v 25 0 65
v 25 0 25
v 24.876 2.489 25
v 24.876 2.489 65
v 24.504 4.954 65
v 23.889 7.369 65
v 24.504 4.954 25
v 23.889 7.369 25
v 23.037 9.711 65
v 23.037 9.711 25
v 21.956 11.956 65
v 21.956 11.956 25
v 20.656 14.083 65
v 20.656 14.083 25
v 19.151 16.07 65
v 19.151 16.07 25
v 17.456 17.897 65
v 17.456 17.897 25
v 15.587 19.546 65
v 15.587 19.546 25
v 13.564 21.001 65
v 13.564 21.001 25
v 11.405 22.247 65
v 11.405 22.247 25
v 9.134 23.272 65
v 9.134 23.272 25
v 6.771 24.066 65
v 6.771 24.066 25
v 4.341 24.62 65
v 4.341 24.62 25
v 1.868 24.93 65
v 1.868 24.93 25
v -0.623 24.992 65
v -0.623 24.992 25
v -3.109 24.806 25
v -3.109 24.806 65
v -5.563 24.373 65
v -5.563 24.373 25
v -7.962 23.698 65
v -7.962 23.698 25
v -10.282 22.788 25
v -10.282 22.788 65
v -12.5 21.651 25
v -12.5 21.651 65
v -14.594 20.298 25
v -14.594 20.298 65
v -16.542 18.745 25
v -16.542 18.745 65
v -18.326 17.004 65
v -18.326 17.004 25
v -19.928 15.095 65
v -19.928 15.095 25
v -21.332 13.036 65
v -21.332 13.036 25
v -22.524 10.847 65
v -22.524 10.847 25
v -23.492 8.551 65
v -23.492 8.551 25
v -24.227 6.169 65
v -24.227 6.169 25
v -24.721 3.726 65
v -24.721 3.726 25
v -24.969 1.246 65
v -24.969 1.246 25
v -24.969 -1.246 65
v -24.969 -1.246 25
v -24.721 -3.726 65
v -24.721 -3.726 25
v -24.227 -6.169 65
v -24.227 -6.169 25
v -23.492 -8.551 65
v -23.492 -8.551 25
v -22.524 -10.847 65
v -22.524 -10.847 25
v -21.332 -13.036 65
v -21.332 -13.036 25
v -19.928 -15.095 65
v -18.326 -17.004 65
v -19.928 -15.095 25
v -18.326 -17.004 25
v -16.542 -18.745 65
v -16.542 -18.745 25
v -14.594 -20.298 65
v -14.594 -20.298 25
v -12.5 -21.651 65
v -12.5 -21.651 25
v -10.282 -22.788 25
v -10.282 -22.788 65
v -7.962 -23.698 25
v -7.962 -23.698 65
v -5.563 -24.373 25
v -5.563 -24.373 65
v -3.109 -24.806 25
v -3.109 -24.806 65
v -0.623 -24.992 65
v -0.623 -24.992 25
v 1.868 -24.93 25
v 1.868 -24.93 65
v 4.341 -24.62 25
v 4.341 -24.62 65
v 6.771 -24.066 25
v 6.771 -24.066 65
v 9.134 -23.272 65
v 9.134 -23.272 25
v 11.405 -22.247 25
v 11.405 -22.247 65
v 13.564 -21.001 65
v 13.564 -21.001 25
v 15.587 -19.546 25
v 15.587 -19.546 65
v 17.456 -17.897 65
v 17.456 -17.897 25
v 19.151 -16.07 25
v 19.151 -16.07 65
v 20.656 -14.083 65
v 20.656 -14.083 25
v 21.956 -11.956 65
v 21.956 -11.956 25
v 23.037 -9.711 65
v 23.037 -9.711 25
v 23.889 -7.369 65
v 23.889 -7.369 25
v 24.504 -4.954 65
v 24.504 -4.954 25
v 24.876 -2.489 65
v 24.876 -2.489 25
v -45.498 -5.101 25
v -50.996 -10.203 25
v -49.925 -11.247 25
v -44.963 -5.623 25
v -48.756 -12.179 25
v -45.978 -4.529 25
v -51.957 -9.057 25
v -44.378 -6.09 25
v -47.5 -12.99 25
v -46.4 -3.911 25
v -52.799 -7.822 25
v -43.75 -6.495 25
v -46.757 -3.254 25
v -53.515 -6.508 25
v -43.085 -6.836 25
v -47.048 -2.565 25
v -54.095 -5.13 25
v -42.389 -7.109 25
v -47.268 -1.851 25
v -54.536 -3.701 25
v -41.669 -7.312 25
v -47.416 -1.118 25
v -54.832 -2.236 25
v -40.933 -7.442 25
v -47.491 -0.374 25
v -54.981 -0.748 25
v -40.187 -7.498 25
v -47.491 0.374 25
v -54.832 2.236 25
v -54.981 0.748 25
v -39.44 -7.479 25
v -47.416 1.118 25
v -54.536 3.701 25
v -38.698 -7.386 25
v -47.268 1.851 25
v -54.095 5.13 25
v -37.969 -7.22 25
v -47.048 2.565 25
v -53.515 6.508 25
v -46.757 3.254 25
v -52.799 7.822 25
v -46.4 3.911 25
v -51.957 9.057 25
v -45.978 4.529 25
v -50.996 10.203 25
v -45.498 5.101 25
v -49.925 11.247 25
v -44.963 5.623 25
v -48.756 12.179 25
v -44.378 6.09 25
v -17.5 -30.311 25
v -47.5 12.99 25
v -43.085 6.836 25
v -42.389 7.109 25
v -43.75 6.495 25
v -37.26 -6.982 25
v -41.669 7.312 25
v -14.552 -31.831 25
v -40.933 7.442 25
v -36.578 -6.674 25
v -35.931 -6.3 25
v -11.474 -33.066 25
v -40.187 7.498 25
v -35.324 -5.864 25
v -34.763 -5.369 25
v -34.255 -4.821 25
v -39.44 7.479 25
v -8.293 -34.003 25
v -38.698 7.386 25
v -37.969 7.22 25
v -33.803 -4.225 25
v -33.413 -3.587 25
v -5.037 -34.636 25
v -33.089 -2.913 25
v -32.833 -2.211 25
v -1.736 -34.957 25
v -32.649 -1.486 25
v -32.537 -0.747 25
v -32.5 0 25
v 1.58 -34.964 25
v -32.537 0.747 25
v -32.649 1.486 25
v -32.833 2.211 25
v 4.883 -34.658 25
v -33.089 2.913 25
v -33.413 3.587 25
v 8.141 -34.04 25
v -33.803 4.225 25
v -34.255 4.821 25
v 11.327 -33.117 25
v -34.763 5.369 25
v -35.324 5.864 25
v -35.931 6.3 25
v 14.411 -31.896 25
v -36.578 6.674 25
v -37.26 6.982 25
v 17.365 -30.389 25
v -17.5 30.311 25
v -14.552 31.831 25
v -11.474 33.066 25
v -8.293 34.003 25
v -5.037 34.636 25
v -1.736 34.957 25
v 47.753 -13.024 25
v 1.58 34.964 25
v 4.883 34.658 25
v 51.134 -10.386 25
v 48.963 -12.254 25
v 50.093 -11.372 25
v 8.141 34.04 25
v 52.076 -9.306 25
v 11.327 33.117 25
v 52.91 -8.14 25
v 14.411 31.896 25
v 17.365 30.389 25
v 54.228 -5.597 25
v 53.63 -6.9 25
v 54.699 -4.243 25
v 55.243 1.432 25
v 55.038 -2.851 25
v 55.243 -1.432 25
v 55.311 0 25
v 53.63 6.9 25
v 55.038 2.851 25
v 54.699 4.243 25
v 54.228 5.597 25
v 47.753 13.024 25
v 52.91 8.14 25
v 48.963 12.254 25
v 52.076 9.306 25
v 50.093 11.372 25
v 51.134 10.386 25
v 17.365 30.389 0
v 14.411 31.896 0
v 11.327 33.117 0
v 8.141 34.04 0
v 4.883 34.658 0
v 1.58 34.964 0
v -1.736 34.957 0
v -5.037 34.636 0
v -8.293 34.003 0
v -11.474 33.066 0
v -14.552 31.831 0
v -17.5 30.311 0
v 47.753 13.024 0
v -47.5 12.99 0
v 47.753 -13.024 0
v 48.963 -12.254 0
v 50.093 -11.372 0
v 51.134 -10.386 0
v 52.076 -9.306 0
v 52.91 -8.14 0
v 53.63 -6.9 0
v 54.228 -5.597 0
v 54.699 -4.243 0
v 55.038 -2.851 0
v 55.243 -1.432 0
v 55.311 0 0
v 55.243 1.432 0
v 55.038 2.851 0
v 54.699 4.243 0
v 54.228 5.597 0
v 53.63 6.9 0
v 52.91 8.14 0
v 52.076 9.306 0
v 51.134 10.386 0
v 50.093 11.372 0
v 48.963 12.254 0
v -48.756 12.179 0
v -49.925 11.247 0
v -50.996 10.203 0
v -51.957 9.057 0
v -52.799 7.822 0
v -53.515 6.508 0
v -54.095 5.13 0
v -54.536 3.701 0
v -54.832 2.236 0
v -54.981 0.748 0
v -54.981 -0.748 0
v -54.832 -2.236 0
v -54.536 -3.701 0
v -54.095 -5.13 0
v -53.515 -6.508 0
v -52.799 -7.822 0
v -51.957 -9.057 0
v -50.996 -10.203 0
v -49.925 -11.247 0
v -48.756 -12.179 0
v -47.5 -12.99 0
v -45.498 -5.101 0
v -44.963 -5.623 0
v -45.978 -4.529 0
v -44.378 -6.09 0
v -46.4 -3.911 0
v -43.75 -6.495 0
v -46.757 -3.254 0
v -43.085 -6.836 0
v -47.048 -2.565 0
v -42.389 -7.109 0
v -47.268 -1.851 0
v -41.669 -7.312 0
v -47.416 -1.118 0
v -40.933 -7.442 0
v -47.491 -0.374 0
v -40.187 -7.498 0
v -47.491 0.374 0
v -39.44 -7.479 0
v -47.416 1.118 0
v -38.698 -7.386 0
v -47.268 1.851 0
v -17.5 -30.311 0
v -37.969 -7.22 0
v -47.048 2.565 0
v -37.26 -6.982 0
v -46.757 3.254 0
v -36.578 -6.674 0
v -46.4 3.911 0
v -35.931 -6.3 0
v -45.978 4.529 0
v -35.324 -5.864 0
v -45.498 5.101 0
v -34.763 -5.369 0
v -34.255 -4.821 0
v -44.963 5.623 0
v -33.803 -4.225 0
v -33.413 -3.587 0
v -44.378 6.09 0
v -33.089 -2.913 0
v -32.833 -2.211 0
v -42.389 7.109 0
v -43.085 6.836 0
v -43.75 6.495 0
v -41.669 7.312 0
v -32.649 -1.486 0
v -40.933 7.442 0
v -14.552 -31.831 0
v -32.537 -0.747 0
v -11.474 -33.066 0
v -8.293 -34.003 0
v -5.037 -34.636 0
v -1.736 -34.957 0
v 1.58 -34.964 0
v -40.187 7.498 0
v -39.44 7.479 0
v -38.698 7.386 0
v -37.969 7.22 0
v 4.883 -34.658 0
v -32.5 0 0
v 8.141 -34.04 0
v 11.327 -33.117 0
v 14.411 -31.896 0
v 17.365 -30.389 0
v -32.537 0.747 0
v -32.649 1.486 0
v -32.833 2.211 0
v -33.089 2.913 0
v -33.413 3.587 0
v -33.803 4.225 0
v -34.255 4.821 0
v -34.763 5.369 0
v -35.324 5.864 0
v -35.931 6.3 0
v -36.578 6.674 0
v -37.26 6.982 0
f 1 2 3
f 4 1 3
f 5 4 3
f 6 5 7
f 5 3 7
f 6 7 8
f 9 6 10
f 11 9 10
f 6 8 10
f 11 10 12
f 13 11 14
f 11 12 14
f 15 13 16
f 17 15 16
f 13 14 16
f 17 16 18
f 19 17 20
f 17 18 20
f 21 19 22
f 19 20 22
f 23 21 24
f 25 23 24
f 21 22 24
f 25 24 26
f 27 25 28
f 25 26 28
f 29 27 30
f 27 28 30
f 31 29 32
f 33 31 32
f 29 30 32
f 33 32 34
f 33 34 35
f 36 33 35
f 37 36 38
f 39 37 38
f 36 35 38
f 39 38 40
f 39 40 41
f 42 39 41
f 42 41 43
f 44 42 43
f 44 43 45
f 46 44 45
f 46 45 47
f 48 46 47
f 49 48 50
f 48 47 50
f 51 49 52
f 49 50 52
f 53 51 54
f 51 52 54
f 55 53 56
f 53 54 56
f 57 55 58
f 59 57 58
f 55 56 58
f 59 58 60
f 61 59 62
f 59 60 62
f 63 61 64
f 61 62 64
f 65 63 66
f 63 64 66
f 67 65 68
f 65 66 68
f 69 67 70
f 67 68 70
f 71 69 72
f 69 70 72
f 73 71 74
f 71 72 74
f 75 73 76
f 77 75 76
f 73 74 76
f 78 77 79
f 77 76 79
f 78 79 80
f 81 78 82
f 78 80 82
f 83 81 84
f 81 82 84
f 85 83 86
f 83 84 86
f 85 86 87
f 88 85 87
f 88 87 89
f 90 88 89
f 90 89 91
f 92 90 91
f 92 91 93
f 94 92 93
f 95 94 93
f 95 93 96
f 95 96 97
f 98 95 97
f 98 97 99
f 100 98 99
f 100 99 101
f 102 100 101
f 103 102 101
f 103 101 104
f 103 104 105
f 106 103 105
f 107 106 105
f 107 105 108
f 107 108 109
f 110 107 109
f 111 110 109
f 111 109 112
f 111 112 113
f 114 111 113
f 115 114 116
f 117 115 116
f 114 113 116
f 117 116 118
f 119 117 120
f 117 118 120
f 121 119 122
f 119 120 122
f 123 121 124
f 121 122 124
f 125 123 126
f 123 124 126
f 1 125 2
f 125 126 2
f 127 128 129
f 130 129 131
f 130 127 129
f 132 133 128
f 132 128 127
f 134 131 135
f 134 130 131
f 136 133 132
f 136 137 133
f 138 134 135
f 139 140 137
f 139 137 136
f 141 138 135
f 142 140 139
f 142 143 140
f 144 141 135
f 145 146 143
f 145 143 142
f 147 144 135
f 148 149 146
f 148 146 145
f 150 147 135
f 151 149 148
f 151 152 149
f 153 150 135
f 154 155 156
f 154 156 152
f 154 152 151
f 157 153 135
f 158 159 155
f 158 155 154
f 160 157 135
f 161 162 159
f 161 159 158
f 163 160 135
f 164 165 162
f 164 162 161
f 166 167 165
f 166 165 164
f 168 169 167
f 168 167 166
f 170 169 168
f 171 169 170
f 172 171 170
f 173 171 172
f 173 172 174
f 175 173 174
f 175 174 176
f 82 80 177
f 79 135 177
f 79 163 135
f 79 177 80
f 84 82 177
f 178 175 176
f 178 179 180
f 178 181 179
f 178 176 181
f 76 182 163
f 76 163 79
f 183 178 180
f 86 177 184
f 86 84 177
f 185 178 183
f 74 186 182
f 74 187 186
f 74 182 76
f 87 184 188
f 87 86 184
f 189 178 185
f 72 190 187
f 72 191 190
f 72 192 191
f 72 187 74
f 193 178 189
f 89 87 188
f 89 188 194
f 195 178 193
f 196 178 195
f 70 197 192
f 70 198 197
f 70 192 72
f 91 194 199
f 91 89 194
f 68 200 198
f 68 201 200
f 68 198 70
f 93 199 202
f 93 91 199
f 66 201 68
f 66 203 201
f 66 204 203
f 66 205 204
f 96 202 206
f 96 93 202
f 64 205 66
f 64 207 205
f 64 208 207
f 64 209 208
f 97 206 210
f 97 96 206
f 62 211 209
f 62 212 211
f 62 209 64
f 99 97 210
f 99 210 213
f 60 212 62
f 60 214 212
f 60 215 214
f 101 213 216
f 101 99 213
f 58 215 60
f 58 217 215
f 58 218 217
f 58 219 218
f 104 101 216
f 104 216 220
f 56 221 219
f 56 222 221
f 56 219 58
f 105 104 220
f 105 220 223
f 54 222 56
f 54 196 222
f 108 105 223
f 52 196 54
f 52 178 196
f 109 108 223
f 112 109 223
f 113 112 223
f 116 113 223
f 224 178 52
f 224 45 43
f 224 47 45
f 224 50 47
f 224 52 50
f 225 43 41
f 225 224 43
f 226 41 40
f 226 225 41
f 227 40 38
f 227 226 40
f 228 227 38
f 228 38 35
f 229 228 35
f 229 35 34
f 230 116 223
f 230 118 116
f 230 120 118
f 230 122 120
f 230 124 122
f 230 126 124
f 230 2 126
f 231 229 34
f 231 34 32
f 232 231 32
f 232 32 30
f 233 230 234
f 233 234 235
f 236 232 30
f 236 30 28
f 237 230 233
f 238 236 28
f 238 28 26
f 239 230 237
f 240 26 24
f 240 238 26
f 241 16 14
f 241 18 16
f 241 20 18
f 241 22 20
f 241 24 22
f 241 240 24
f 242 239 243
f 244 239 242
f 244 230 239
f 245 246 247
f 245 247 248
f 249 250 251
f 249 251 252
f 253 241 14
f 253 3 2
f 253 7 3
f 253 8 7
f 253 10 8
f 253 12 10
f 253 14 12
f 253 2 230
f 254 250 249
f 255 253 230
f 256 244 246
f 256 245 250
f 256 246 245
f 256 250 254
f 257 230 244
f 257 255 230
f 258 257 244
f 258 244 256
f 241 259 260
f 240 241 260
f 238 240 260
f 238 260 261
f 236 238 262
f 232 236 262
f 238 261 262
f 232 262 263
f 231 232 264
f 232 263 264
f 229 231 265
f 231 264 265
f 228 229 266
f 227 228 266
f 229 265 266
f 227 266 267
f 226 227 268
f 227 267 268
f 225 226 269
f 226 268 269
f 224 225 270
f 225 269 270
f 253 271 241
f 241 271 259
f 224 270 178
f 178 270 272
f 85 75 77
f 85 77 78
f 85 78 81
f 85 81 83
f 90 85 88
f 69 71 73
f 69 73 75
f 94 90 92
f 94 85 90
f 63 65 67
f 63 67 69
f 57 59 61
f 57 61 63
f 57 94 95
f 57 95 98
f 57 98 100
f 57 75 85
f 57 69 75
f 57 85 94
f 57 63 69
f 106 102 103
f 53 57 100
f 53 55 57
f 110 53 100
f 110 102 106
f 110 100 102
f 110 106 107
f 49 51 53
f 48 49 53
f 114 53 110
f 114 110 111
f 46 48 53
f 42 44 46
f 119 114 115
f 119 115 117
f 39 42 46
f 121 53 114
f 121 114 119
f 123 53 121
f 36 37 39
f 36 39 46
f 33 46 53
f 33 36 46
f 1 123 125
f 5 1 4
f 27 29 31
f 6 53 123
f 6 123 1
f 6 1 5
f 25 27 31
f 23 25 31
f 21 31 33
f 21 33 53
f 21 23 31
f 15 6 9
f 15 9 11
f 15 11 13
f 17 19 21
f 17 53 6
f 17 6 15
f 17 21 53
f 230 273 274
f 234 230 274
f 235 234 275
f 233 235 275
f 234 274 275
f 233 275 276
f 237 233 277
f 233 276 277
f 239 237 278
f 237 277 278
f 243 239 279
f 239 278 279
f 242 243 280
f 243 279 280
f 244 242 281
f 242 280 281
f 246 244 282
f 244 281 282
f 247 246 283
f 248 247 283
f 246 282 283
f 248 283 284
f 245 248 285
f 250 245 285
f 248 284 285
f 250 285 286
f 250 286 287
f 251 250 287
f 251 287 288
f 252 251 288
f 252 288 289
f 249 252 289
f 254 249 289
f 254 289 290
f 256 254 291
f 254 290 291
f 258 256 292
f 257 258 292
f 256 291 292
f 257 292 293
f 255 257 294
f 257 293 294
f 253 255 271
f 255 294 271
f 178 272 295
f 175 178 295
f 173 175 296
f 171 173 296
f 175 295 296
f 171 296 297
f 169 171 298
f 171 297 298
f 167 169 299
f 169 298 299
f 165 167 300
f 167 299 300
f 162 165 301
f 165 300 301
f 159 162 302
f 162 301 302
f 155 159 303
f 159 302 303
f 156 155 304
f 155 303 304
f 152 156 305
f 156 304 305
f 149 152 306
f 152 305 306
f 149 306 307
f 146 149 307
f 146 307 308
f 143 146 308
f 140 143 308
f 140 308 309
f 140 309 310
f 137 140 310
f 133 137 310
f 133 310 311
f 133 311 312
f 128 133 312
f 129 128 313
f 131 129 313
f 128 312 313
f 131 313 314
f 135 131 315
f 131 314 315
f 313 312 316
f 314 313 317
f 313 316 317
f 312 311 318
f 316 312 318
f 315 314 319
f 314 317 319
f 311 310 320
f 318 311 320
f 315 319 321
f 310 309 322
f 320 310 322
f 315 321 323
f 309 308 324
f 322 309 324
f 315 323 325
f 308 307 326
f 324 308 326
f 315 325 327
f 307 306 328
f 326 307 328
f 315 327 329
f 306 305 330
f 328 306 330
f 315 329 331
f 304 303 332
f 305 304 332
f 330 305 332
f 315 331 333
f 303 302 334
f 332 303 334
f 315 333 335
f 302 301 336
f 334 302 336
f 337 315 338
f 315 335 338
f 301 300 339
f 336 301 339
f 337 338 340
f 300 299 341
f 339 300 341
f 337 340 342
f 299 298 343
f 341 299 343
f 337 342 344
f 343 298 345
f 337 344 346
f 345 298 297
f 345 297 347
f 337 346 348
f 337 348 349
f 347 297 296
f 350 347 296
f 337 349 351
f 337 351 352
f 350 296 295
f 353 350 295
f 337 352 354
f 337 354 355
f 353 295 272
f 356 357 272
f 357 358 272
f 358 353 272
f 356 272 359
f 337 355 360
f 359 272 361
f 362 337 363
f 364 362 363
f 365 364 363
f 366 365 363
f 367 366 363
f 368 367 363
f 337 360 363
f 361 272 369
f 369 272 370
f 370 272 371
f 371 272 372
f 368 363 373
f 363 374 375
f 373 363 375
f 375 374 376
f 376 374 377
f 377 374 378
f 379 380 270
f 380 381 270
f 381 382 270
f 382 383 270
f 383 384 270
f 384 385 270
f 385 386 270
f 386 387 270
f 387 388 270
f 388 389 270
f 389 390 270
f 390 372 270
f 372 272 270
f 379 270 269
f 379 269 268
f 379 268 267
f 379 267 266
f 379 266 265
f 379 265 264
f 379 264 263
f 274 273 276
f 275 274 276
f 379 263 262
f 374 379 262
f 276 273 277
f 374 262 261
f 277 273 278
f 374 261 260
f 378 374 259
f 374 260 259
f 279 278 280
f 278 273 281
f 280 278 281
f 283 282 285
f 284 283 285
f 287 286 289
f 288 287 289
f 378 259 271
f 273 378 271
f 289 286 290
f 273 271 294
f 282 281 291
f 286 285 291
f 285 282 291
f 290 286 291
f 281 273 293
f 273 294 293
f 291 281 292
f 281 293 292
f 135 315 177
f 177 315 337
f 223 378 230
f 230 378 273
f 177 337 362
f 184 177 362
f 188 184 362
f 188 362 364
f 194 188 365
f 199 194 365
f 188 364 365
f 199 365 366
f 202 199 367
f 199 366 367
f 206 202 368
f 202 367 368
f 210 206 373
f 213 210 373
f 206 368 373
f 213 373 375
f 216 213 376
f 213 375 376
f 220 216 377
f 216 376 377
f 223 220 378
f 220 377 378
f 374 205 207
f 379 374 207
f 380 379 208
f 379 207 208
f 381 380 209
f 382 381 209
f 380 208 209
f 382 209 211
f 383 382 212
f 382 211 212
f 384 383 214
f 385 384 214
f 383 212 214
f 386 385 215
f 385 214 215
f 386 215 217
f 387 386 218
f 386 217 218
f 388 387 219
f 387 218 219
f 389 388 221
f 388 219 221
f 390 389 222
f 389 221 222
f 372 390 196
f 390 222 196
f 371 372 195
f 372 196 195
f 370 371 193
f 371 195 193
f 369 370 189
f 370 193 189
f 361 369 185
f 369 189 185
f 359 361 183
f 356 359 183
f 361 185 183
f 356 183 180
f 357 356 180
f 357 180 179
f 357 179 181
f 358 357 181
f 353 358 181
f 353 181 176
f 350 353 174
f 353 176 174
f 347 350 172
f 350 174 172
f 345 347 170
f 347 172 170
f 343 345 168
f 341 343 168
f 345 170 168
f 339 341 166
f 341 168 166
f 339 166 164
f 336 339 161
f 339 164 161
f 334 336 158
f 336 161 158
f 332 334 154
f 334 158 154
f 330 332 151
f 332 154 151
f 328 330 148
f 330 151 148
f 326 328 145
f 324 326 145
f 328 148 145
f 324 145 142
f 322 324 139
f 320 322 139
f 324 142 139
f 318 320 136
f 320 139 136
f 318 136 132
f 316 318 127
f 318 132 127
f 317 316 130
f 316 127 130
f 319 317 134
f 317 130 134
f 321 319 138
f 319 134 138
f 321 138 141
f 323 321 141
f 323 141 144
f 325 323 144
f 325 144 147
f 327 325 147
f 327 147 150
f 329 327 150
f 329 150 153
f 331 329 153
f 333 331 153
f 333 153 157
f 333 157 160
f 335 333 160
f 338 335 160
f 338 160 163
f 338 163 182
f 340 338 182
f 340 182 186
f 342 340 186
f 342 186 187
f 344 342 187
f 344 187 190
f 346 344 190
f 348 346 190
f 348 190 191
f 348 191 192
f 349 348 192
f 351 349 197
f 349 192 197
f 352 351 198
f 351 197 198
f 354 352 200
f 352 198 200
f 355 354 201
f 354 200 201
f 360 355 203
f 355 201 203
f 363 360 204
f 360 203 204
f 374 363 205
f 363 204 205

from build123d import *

# Parameters (mm, degrees)
F1_DEPTH = 25
F2_R     = 7.5
F3_DEPTH = 25
F4_R     = 25
F5_DEPTH = 40


with BuildPart() as f1:
    # F0 (on Top) → F1 (new body)
    with BuildSketch(Plane.XY):
        with BuildLine():
            Line((-17.5, 30.310889), (-47.5, 12.990381))
            ThreePointArc((-47.5, 12.990381), (-55, 0), (-47.5, -12.990381))
            Line((-47.5, -12.990381), (-17.5, -30.310889))
            ThreePointArc((-17.5, -30.310889), (-0.077922, -34.999913), (17.364863, -30.38851))
            Line((17.364863, -30.38851), (47.753373, -13.023647))
            ThreePointArc((47.753373, -13.023647), (55.311289, 0), (47.753373, 13.023647))
            Line((47.753373, 13.023647), (17.364863, 30.38851))
            ThreePointArc((17.364863, 30.38851), (-0.077922, 34.999913), (-17.5, 30.310889))
        make_face()
    extrude(amount=F1_DEPTH)

    # F2 (on face) → F3 (cut)
    with BuildSketch(Plane.XY.offset(25)):
        with Locations((-40, 0)):
            Circle(F2_R)
    extrude(amount=-F3_DEPTH, mode=Mode.SUBTRACT)

    # F4 (on face) → F5 (join)
    with BuildSketch(Plane.XY.offset(25)):
        Circle(F4_R)
    extrude(amount=F5_DEPTH)


solid = f1.part
